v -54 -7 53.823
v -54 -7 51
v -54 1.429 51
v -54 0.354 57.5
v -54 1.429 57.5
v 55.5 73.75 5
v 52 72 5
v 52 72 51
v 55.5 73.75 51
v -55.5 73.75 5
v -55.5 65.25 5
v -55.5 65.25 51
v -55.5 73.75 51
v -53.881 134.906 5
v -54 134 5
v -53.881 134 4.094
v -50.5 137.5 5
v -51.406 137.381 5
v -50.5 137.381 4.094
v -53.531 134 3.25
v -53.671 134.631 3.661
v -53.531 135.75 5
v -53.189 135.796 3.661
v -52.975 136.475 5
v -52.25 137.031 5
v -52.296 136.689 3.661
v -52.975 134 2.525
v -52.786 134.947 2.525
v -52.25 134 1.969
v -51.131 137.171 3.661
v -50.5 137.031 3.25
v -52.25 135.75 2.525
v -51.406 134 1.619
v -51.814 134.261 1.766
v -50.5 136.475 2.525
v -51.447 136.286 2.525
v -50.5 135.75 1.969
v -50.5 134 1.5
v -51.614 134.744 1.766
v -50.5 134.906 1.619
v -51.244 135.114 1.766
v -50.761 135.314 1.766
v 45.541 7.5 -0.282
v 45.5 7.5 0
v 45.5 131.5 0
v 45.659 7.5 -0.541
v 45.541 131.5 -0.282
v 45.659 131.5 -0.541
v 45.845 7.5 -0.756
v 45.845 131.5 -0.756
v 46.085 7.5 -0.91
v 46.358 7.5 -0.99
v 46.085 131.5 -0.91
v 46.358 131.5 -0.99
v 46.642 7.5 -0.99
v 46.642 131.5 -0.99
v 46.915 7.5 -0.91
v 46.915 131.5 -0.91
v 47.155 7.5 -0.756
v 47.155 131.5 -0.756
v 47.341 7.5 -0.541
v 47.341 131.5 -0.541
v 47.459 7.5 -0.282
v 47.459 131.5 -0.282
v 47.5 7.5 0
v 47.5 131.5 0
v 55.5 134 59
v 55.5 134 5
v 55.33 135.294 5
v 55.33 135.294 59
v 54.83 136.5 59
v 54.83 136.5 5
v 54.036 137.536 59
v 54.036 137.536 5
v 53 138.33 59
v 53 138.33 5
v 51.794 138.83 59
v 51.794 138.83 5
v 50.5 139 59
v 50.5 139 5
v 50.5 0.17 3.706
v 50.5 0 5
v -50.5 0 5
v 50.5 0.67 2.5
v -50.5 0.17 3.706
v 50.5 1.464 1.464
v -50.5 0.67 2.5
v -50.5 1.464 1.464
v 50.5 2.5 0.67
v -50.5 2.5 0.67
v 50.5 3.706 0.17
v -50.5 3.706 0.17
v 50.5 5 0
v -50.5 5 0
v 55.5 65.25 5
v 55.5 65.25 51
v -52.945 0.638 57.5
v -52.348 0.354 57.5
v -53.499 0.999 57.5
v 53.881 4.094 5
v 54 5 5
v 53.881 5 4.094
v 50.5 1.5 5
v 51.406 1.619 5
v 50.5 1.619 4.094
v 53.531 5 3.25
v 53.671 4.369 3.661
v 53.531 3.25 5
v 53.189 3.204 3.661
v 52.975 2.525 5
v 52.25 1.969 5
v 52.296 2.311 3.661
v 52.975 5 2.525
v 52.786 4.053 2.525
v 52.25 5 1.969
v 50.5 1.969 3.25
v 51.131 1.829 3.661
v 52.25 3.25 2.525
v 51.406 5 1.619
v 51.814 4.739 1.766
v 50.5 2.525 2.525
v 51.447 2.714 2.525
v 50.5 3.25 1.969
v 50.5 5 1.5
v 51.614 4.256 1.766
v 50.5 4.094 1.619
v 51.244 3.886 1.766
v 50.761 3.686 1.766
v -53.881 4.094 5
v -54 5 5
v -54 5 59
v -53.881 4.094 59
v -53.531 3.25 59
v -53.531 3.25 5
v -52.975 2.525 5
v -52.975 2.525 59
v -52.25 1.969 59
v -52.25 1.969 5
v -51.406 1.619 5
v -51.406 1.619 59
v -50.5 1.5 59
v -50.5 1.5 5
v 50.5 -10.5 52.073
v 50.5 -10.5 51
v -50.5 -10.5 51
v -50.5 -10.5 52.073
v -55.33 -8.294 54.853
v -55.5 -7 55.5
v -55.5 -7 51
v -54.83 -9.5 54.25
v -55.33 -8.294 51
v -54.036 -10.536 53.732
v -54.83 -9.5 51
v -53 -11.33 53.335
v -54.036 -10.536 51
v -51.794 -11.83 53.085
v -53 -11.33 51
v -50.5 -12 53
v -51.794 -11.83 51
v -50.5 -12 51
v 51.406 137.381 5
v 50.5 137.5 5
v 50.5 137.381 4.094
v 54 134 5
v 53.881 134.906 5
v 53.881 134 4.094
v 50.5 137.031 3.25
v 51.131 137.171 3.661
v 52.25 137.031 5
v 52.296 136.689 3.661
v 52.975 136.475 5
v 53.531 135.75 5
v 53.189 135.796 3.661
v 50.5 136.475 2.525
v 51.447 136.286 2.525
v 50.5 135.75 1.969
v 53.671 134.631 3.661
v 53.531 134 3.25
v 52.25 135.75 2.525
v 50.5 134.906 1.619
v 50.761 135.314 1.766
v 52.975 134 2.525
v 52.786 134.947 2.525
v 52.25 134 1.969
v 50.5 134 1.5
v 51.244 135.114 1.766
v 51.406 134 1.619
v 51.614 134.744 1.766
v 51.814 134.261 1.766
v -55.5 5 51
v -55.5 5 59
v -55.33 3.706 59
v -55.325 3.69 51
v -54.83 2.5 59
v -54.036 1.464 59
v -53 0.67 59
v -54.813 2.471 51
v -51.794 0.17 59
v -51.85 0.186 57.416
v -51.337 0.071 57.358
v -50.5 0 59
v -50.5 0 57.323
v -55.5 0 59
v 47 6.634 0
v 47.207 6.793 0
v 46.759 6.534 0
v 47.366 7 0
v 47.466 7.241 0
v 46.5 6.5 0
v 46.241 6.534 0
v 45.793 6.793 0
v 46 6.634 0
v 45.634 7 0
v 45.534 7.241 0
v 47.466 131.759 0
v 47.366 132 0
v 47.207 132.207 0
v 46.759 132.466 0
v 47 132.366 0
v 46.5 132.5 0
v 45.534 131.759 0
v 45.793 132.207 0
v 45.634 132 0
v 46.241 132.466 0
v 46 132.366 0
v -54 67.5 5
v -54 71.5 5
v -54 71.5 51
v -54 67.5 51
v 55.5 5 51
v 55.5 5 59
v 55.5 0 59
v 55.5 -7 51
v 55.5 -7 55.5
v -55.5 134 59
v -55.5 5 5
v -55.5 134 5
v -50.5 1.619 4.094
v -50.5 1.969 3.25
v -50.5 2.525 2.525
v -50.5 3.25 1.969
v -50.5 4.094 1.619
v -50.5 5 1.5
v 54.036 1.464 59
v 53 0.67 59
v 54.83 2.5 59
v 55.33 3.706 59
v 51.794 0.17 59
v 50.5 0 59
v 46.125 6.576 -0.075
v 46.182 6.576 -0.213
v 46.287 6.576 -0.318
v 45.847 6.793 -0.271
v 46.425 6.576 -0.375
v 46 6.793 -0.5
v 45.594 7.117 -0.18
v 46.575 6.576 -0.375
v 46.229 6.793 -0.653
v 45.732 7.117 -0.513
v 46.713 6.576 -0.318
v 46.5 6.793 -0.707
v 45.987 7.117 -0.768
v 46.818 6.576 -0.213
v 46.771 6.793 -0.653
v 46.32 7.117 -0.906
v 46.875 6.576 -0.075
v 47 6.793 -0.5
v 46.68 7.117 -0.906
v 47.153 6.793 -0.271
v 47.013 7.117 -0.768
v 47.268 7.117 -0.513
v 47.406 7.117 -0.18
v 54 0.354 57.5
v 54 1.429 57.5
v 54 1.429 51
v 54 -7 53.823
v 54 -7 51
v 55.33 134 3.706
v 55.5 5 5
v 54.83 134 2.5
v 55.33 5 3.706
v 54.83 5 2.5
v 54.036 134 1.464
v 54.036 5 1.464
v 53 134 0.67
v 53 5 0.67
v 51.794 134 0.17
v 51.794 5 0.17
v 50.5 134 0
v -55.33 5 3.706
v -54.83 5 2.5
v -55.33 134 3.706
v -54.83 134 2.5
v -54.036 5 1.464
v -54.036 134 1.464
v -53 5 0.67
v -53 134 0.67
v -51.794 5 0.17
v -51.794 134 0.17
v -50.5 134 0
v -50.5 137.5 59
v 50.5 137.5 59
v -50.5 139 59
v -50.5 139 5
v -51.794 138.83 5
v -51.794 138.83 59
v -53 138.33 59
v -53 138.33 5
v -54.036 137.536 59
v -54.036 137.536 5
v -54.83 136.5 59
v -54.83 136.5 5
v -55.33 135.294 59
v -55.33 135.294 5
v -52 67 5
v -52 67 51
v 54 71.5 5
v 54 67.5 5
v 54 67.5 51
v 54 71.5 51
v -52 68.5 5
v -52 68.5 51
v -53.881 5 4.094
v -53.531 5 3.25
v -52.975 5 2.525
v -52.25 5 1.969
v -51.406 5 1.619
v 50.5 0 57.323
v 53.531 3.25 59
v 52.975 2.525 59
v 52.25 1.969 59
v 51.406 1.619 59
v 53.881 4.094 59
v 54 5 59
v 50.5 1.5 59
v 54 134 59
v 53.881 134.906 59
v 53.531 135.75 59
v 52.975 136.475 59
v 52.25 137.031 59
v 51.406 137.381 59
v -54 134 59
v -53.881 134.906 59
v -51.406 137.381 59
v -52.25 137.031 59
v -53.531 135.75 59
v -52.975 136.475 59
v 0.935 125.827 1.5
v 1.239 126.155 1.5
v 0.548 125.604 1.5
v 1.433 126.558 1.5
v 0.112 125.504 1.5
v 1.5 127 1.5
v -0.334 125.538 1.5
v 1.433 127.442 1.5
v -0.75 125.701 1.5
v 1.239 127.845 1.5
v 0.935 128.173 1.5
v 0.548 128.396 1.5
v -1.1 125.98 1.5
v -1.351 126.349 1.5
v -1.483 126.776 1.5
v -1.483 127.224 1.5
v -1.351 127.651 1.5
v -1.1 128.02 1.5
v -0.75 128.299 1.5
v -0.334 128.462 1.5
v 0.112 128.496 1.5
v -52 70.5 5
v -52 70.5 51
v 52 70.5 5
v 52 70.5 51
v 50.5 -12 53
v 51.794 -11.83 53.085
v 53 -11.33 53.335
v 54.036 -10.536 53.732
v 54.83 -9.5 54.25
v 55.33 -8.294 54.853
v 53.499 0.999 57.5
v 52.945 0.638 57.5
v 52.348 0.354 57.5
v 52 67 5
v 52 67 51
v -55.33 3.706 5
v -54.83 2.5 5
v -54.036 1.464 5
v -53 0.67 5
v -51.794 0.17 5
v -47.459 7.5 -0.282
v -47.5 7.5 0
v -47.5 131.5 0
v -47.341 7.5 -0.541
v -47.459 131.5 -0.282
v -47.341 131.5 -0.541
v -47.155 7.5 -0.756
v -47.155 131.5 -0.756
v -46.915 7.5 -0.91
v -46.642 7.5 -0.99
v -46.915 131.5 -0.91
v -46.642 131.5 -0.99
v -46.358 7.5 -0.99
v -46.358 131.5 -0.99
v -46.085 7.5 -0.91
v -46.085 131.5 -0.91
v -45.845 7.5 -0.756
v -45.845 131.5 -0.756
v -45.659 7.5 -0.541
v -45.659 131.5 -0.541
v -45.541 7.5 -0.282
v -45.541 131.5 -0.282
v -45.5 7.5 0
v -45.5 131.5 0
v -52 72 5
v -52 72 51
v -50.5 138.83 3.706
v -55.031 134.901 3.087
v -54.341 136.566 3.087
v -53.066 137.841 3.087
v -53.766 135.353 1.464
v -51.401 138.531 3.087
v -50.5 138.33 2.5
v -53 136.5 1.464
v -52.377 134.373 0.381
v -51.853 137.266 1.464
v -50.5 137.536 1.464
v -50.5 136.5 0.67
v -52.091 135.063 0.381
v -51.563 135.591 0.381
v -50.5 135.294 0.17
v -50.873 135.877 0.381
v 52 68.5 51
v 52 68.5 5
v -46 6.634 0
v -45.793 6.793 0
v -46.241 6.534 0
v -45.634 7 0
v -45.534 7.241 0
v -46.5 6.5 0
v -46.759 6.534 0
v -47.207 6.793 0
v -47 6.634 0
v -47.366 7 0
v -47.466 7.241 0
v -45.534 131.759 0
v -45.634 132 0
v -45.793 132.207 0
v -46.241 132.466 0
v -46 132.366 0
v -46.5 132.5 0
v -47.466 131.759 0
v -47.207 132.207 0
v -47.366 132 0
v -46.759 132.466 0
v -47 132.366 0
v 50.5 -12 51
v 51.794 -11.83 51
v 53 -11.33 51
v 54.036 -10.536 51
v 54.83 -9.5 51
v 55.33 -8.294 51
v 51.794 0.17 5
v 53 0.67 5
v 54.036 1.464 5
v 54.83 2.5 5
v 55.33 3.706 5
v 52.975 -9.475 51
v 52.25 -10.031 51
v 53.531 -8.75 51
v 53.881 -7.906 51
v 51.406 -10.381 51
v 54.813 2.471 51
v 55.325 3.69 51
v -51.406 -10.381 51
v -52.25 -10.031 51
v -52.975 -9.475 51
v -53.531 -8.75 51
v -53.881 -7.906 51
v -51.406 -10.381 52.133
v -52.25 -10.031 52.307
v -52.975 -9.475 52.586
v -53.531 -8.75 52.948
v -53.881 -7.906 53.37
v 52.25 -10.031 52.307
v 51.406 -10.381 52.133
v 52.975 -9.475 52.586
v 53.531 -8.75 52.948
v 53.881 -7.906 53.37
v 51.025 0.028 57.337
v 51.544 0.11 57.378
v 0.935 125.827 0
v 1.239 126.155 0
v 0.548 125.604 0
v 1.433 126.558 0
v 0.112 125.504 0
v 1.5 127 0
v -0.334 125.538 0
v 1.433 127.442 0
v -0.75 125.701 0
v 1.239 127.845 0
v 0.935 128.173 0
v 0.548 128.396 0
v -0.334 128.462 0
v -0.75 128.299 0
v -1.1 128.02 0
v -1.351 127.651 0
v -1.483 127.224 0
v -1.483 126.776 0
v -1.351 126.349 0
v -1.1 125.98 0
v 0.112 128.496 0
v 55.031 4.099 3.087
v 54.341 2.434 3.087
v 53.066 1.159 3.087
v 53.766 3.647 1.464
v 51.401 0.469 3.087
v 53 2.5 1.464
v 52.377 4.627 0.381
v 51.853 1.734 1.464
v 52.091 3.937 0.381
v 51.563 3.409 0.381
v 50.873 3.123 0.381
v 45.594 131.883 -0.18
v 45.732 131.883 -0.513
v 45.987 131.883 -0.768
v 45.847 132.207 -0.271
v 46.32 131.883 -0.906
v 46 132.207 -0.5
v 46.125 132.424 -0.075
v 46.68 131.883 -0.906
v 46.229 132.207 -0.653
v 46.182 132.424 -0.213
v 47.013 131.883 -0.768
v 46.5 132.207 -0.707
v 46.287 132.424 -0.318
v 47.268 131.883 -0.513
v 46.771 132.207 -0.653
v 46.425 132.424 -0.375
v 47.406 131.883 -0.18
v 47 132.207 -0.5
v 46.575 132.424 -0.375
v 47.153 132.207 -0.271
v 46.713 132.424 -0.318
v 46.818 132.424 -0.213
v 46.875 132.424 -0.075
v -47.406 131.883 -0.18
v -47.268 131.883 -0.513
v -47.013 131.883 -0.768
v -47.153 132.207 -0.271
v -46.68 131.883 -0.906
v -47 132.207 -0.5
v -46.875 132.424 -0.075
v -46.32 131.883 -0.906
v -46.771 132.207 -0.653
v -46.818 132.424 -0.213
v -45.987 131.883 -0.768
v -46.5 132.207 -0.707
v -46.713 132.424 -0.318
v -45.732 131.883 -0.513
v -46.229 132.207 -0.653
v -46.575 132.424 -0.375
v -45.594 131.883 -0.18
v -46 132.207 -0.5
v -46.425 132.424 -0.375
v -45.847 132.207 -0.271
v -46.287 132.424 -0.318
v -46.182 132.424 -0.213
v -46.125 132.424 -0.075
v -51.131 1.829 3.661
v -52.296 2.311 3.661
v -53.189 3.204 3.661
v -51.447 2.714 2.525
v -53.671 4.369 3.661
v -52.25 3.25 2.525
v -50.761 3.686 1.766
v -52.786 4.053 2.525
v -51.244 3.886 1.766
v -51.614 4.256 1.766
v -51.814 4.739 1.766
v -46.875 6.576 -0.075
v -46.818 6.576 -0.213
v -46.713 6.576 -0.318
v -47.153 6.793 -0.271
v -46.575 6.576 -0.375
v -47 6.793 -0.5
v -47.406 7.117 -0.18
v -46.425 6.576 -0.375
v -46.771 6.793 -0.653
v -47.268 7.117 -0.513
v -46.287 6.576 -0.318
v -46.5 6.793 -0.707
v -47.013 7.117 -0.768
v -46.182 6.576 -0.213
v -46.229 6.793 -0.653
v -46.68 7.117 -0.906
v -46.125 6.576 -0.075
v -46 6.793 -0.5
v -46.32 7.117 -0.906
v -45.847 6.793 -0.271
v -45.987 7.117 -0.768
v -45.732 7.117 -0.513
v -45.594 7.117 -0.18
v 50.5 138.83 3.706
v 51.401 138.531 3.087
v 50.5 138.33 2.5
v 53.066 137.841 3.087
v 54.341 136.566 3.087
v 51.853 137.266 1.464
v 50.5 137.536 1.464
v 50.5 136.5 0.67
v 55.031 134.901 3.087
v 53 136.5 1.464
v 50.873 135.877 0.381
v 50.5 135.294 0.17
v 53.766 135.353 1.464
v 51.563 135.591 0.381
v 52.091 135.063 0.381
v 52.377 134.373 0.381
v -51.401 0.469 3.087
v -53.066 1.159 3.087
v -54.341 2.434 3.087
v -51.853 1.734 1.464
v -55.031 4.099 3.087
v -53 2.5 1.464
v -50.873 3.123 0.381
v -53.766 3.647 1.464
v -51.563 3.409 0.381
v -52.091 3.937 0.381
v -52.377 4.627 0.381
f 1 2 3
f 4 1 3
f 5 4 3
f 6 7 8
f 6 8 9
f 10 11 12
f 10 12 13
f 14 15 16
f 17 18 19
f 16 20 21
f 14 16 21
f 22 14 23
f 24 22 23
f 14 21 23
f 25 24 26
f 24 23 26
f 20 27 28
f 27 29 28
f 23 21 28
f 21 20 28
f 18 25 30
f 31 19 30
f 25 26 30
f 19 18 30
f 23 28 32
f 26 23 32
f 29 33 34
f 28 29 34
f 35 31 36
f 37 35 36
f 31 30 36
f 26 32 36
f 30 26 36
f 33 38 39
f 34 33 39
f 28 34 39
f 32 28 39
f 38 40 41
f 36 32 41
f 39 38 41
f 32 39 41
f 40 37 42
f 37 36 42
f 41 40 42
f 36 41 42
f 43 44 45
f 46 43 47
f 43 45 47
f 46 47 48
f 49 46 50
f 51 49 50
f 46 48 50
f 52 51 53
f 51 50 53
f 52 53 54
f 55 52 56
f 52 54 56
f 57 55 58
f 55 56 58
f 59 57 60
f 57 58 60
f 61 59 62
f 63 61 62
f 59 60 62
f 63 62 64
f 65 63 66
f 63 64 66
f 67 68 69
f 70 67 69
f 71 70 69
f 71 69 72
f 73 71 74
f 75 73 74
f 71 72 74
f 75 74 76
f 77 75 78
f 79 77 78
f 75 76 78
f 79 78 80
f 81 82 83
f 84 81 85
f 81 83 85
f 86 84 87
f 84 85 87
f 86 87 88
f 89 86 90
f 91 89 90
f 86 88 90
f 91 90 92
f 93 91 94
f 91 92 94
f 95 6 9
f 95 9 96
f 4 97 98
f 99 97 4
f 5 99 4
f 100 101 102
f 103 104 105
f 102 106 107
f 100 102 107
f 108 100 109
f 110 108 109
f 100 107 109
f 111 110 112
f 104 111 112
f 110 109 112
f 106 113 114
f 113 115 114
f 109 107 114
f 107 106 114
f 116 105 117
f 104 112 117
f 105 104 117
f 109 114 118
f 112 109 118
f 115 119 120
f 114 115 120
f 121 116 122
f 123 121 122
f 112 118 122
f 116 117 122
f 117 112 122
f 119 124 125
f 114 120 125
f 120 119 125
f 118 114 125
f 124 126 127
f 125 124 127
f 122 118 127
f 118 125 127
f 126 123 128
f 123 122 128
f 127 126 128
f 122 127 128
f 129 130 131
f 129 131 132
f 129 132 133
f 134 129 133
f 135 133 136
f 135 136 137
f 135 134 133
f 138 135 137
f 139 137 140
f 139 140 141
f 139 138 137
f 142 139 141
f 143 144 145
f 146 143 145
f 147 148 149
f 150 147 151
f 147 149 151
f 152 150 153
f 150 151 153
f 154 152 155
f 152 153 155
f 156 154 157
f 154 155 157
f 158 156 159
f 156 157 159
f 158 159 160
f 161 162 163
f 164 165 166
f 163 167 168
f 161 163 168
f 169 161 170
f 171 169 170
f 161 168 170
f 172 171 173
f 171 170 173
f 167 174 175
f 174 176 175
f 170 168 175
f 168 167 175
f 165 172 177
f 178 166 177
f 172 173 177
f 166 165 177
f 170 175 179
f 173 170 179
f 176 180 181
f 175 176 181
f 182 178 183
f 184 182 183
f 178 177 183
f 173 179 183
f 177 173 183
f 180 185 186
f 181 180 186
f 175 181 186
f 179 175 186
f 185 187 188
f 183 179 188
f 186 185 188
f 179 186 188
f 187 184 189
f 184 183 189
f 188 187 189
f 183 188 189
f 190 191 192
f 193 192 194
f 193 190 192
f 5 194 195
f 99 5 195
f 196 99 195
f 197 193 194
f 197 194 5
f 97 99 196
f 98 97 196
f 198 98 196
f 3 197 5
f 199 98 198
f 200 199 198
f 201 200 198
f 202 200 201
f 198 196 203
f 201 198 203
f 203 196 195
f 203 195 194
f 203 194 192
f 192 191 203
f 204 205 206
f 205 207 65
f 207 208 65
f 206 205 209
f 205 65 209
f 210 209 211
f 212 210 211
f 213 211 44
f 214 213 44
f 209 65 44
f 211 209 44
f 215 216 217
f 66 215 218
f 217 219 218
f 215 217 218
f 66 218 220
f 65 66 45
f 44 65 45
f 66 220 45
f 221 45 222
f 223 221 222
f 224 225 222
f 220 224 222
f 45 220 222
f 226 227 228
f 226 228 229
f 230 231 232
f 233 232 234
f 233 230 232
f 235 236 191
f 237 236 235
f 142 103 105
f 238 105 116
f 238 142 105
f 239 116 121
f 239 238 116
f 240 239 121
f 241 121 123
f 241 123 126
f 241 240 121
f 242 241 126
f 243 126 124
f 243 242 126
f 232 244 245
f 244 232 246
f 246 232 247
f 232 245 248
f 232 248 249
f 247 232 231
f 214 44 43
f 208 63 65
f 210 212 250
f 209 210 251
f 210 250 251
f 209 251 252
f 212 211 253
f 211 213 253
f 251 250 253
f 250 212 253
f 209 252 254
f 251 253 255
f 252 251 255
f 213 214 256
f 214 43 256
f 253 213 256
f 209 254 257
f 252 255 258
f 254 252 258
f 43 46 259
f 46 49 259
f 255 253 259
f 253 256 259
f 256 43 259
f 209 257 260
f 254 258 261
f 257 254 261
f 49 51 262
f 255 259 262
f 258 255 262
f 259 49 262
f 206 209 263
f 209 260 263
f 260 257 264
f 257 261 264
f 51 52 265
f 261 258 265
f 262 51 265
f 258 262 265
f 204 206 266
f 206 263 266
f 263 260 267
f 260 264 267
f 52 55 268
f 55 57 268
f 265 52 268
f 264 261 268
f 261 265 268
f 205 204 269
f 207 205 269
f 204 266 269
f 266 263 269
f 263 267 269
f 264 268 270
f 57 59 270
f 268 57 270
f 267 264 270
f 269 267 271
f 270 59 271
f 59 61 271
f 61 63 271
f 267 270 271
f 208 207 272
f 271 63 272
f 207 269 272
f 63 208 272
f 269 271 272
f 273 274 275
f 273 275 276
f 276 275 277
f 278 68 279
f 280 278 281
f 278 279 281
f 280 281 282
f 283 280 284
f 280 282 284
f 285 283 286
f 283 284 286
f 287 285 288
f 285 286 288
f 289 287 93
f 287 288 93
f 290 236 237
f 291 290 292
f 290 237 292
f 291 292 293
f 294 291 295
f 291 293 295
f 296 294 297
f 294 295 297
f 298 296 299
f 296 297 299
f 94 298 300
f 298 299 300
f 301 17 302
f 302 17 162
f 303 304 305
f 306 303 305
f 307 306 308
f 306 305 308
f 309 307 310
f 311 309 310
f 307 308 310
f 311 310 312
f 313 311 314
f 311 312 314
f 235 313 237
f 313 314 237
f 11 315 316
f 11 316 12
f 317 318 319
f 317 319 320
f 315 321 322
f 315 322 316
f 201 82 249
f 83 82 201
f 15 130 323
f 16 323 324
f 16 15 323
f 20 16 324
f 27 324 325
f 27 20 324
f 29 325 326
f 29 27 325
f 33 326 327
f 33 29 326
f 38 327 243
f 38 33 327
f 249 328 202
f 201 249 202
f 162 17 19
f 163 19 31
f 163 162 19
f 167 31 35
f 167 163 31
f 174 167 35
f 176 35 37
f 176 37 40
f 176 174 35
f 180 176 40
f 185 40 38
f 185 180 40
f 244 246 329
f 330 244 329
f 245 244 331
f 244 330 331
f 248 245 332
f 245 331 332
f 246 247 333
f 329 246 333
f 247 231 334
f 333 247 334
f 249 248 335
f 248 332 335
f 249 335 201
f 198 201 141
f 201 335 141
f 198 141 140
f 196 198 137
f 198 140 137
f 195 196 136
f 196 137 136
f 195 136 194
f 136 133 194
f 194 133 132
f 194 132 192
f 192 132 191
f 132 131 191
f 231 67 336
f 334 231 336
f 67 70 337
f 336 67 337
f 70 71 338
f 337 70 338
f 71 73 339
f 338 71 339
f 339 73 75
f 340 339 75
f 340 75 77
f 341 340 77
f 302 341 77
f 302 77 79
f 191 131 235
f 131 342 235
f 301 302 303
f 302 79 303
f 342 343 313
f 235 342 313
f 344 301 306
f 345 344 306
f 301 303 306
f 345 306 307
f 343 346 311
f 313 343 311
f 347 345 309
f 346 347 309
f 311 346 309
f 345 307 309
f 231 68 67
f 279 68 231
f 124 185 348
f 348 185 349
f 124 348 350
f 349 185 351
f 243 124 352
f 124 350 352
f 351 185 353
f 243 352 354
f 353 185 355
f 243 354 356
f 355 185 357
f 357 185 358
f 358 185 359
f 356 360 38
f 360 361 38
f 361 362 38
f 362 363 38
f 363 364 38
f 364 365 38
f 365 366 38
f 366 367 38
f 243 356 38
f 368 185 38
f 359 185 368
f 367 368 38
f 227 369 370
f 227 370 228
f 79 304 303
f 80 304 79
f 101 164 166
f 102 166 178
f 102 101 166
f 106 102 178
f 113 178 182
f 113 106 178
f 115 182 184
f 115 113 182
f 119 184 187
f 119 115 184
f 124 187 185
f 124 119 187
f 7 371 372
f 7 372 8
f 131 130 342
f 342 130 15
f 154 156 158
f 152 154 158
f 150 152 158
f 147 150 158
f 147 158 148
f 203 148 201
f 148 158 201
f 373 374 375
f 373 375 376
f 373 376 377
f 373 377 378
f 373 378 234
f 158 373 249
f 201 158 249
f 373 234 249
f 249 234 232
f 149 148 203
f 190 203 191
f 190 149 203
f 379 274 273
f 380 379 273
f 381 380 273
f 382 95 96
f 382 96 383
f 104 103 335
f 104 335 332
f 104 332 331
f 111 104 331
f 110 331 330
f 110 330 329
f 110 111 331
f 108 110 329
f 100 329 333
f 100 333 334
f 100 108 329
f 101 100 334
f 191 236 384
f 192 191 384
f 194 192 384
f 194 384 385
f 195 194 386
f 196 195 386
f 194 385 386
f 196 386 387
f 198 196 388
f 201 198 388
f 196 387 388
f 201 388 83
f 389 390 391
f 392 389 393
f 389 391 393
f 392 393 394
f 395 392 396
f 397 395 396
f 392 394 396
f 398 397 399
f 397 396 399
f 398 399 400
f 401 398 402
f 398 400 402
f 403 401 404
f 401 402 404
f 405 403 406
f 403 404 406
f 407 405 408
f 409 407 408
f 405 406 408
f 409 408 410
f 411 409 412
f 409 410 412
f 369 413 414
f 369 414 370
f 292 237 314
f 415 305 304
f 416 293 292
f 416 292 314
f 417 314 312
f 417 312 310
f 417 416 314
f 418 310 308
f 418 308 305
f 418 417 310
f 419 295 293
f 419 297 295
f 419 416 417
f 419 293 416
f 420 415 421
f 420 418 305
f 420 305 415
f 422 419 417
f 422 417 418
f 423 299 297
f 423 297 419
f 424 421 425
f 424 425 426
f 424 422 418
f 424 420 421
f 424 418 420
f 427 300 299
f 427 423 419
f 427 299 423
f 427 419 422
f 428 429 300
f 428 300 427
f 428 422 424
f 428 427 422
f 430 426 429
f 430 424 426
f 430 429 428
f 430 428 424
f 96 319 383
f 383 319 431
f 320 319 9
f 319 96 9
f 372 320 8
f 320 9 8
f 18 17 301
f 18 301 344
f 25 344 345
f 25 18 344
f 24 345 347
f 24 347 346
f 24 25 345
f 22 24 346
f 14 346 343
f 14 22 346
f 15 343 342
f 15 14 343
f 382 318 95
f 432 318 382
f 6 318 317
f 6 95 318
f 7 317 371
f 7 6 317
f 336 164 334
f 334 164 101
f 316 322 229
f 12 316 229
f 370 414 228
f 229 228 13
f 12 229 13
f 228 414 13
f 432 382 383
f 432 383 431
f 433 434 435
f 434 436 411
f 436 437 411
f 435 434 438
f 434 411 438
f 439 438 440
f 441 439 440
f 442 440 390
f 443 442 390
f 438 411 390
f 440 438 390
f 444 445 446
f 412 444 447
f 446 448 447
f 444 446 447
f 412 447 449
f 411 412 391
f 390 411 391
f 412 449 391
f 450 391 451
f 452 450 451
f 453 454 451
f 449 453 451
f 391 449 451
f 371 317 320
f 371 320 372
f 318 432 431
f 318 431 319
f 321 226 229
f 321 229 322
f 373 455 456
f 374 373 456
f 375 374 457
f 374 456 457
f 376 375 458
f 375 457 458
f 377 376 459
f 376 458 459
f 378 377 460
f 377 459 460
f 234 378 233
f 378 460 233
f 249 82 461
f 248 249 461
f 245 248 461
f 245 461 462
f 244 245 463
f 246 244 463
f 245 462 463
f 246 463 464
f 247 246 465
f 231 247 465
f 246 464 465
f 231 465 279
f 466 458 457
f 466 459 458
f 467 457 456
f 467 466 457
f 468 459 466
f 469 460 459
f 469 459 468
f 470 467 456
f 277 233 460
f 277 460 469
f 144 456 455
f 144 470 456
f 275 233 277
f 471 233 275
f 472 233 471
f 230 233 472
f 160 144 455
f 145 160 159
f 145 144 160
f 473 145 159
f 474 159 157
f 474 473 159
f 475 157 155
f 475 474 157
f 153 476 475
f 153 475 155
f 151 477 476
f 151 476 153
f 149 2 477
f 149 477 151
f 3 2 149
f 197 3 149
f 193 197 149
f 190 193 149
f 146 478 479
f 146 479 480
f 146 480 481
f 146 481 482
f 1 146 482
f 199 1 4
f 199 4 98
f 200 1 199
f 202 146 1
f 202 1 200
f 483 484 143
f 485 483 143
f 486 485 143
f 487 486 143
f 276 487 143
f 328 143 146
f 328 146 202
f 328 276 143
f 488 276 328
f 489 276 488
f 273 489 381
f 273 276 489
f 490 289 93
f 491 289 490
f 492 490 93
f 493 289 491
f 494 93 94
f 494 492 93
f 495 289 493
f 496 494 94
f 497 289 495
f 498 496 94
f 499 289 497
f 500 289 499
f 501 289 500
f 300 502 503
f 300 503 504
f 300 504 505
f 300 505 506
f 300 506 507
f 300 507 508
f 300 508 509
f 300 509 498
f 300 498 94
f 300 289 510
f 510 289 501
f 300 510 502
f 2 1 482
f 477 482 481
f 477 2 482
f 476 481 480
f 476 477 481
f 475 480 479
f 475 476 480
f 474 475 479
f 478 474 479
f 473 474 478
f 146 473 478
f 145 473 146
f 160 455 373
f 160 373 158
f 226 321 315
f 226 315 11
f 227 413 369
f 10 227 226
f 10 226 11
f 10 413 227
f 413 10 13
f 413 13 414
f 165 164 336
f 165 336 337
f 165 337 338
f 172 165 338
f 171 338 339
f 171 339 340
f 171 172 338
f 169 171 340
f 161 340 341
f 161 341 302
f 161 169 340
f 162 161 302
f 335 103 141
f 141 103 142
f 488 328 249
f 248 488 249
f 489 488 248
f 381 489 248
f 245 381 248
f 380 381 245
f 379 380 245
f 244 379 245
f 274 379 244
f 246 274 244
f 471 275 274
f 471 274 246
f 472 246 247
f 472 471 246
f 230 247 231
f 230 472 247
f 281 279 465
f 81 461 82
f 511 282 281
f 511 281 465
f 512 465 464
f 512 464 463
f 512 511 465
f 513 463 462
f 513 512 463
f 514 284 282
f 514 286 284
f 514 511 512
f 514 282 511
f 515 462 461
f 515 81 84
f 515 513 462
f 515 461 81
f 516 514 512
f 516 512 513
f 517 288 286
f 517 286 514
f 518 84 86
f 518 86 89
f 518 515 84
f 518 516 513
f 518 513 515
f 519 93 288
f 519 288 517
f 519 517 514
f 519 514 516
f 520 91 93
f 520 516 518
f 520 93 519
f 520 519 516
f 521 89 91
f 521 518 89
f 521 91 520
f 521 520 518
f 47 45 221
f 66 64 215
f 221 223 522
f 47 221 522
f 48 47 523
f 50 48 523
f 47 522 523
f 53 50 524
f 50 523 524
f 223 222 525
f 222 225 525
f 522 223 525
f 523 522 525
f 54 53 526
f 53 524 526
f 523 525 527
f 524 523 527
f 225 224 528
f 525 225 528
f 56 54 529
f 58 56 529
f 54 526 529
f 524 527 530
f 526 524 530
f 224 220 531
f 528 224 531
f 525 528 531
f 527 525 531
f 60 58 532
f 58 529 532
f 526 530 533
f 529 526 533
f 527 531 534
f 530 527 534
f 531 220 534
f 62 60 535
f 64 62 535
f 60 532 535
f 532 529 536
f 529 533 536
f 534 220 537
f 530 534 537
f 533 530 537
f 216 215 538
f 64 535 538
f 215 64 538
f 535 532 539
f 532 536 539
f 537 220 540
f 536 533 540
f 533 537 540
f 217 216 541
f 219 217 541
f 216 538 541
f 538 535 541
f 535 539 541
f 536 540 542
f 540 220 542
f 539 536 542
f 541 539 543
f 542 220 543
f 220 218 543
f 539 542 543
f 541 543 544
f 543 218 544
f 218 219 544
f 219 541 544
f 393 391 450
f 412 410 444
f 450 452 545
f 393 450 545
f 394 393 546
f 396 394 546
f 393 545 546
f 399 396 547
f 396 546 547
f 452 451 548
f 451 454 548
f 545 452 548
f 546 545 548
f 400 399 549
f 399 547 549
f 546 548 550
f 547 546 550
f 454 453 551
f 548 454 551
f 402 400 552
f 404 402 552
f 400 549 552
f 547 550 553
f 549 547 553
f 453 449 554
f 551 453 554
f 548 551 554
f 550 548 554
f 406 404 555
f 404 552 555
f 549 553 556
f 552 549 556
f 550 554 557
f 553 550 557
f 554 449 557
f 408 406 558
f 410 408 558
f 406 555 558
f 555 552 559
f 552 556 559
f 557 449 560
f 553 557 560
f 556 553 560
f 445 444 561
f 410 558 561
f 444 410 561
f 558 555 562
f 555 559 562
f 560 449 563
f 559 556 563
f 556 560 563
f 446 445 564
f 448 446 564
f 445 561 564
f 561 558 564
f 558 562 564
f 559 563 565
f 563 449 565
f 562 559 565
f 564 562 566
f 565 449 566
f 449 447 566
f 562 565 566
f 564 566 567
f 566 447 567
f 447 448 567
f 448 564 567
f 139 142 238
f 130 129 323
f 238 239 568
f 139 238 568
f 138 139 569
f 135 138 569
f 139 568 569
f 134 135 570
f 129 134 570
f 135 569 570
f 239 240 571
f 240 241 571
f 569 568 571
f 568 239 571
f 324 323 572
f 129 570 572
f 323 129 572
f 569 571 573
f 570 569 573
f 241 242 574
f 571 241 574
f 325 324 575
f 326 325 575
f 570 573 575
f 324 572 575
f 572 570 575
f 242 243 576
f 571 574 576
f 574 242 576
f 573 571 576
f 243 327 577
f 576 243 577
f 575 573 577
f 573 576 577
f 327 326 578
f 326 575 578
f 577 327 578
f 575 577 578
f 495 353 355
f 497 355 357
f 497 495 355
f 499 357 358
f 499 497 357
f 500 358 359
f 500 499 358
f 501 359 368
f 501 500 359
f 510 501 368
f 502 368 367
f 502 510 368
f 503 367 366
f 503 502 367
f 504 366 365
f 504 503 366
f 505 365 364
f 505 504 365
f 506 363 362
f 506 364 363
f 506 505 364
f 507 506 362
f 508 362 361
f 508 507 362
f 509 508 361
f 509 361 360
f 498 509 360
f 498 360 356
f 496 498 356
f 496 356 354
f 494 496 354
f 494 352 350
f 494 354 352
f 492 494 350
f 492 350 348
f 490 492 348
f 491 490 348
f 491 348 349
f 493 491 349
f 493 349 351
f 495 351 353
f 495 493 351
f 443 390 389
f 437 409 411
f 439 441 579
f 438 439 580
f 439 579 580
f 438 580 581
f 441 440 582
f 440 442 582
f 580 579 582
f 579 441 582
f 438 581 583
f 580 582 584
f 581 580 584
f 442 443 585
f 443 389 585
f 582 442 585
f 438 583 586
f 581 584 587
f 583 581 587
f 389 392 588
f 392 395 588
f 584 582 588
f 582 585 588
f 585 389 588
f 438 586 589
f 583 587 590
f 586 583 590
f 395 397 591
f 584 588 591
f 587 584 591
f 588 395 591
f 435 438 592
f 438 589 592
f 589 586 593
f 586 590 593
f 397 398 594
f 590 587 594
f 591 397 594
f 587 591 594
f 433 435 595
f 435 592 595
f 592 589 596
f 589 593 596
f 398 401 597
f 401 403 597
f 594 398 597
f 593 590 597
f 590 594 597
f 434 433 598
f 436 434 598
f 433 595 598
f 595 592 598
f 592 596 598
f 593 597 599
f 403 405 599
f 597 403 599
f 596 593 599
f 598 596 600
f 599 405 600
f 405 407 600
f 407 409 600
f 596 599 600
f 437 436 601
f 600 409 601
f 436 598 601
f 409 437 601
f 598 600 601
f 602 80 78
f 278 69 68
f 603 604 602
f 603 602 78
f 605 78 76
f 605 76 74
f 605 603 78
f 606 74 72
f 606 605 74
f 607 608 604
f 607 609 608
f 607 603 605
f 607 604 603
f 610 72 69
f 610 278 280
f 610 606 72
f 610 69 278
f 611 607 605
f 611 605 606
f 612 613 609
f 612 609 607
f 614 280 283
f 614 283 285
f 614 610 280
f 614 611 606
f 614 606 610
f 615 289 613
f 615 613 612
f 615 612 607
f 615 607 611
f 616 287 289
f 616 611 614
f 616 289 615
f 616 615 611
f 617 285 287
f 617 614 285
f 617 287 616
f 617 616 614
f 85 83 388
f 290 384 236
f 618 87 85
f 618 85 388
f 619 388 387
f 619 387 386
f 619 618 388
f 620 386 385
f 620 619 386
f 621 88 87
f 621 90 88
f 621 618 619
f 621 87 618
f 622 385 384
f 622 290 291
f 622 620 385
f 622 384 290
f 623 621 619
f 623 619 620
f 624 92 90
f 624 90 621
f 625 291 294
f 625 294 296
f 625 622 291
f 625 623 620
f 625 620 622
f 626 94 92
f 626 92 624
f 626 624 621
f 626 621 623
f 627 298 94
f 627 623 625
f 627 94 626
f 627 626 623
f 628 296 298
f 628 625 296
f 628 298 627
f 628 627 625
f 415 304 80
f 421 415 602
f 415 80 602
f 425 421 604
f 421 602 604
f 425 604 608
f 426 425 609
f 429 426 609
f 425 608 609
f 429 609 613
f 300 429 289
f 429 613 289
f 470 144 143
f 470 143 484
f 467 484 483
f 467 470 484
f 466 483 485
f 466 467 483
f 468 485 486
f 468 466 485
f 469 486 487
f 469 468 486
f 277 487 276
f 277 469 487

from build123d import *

# Parameters (mm, degrees)
PAD_DEPTH           = 59
FILLET_R            = 5
THICKNESS_T         = -1.5
SKETCH009_R         = 1.5
HOLE_DEPTH          = 25
HOLE_TIPS_R         = 1.5
PAD001_DEPTH        = 8
POCKET_DEPTH        = 55.5
THICKNESS001_T      = -1.5
POCKET001_DEPTH     = 8
REVOLUTION_ANGLE    = -180
REVOLUTION001_ANGLE = -180
PAD002_DEPTH        = 46
PAD003_DEPTH        = 46


with BuildPart() as binbody:
    # Sketch004 → Pad (new body)
    with BuildSketch(Plane.XY):
        with BuildLine():
            Line((-50.5, 139), (50.5, 139))
            ThreePointArc((55.5, 134), (54.0355339059, 137.5355339059), (50.5, 139))
            Line((55.5, 134), (55.5, 5))
            ThreePointArc((50.5, 0), (54.0355339059, 1.4644660941), (55.5, 5))
            Line((50.5, 0), (-50.5, 0))
            ThreePointArc((-55.5, 5), (-54.0355339059, 1.4644660941), (-50.5, 0))
            Line((-55.5, 5), (-55.5, 134))
            ThreePointArc((-50.5, 139), (-54.0355339059, 137.5355339059), (-55.5, 134))
        make_face()
    extrude(amount=PAD_DEPTH)

    # Fillet
    fillet_edges = [binbody.edges().sort_by_distance(p)[0] for p in [
        (0, 0, 0),
        (54.035534, 1.464466, 0),
        (55.5, 69.5, 0),
        (54.035534, 137.535534, 0),
        (0, 139, 0),
        (-54.035534, 137.535534, 0),
        (-55.5, 69.5, 0),
        (-54.035534, 1.464466, 0),
    ]]
    fillet(fillet_edges, radius=FILLET_R)

    # Thickness
    thickness_openings = [binbody.faces().sort_by_distance(p)[0] for p in [
        (0, 69.5, 59),
    ]]
    offset(amount=THICKNESS_T, openings=thickness_openings)

    # Sketch009 → Hole (cut)
    with BuildSketch(Plane.XY):
        with Locations((0, 127)):
            Circle(SKETCH009_R)
    extrude(amount=HOLE_DEPTH, mode=Mode.SUBTRACT)

    # Hole tips → Hole tip 1 section 0
    with BuildSketch(Plane.XY.offset(25), mode=Mode.PRIVATE) as hole_tip_1_s0:
        with Locations((0, 127)):
            Circle(HOLE_TIPS_R)
    loft([hole_tip_1_s0.sketch, Vertex(0, 127, 25.9012909285)], mode=Mode.SUBTRACT)


with BuildPart() as handlebody:
    # Sketch005 → Pad001 (new body)
    with BuildSketch(Plane.XY):
        with BuildLine():
            Line((-55.5, -7), (-55.5, 5))
            Line((-55.5, 5), (55.5, 5))
            Line((55.5, 5), (55.5, -7))
            ThreePointArc((50.5, -12), (54.0355339059, -10.5355339059), (55.5, -7))
            Line((50.5, -12), (-50.5, -12))
            ThreePointArc((-55.5, -7), (-54.0355339059, -10.5355339059), (-50.5, -12))
        make_face()
    extrude(amount=PAD001_DEPTH)

    # Sketch006 → Pocket (cut, symmetric)
    with BuildSketch(Plane.YZ):
        Polygon((0, 10), (-14, 10), (-14, -2), (0, -2), (0, 0), (-12, 0), (-12, 2), (0, 8), align=None)
    extrude(amount=POCKET_DEPTH, both=True, mode=Mode.SUBTRACT)

    # Thickness001
    thickness001_openings = [handlebody.faces().sort_by_distance(p)[0] for p in [
        (0, -3.457777, 0),
    ]]
    offset(amount=THICKNESS001_T, openings=thickness001_openings)

    # Sketch007 → Pocket001 (cut)
    with BuildSketch(Plane.XY):
        with BuildLine():
            Line((-55.5, 10), (55.5, 10))
            Line((55.5, 10), (55.5, 5))
            ThreePointArc((50.5, 0), (54.0355339059, 1.4644660941), (55.5, 5))
            Line((50.5, 0), (-50.5, 0))
            ThreePointArc((-55.5, 5), (-54.0355339059, 1.4644660941), (-50.5, 0))
            Line((-55.5, 5), (-55.5, 10))
        make_face()
    extrude(amount=POCKET001_DEPTH, mode=Mode.SUBTRACT)


with BuildPart() as handlebody_1:
    # Body001 placement: moved
    add(handlebody.part.moved(Location((0, 0, 51))))


with BuildPart() as railleft:
    # Clone2D005 → Revolution (revolve)
    with BuildSketch(Plane.XY):
        with BuildLine():
            Line((0, 132.5), (0, 6.5))
            ThreePointArc((0, 6.5), (-0.7071067812, 6.7928932188), (-1, 7.5))
            Line((-1, 7.5), (-1, 131.5))
            ThreePointArc((-1, 131.5), (-0.7071067812, 132.2071067812), (0, 132.5))
        make_face()
    revolve(axis=Axis((0, 0, 0), (0, 1, 0)), revolution_arc=REVOLUTION_ANGLE)


with BuildPart() as railleft_1:
    # Body002 placement: moved
    add(railleft.part.moved(Location((-46.5, 0, 0))))


with BuildPart() as railright:
    # Clone2D006 → Revolution001 (revolve)
    with BuildSketch(Plane.XY):
        with BuildLine():
            Line((0, 132.5), (0, 6.5))
            ThreePointArc((0, 6.5), (-0.7071067812, 6.7928932188), (-1, 7.5))
            Line((-1, 7.5), (-1, 131.5))
            ThreePointArc((-1, 131.5), (-0.7071067812, 132.2071067812), (0, 132.5))
        make_face()
    revolve(axis=Axis((0, 0, 0), (0, 1, 0)), revolution_arc=REVOLUTION001_ANGLE)


with BuildPart() as railright_1:
    # Body003 placement: moved
    add(railright.part.moved(Location((46.5, 0, 0))))


with BuildPart() as dividerholderleft:
    # Sketch012 → Pad002 (new body)
    with BuildSketch(Plane.XY):
        Polygon((-55.5, 73.75), (-52, 72), (-52, 70.5), (-54, 71.5), (-54, 67.5), (-52, 68.5), (-52, 67), (-55.5, 65.25), align=None)
    extrude(amount=PAD002_DEPTH)


with BuildPart() as dividerholderleft_1:
    # Body005 placement: moved
    add(dividerholderleft.part.moved(Location((0, 0, 5))))


with BuildPart() as dividerholderright:
    # Sketch013 → Pad003 (new body)
    with BuildSketch(Plane.XY):
        Polygon((54, 71.5), (52, 70.5), (52, 72), (55.5, 73.75), (55.5, 65.25), (52, 67), (52, 68.5), (54, 67.5), align=None)
    extrude(amount=PAD003_DEPTH)


with BuildPart() as dividerholderright_1:
    # Body006 placement: moved
    add(dividerholderright.part.moved(Location((0, 0, 5))))


solid = Compound([binbody.part, handlebody_1.part, railleft_1.part, railright_1.part, dividerholderleft_1.part, dividerholderright_1.part])
